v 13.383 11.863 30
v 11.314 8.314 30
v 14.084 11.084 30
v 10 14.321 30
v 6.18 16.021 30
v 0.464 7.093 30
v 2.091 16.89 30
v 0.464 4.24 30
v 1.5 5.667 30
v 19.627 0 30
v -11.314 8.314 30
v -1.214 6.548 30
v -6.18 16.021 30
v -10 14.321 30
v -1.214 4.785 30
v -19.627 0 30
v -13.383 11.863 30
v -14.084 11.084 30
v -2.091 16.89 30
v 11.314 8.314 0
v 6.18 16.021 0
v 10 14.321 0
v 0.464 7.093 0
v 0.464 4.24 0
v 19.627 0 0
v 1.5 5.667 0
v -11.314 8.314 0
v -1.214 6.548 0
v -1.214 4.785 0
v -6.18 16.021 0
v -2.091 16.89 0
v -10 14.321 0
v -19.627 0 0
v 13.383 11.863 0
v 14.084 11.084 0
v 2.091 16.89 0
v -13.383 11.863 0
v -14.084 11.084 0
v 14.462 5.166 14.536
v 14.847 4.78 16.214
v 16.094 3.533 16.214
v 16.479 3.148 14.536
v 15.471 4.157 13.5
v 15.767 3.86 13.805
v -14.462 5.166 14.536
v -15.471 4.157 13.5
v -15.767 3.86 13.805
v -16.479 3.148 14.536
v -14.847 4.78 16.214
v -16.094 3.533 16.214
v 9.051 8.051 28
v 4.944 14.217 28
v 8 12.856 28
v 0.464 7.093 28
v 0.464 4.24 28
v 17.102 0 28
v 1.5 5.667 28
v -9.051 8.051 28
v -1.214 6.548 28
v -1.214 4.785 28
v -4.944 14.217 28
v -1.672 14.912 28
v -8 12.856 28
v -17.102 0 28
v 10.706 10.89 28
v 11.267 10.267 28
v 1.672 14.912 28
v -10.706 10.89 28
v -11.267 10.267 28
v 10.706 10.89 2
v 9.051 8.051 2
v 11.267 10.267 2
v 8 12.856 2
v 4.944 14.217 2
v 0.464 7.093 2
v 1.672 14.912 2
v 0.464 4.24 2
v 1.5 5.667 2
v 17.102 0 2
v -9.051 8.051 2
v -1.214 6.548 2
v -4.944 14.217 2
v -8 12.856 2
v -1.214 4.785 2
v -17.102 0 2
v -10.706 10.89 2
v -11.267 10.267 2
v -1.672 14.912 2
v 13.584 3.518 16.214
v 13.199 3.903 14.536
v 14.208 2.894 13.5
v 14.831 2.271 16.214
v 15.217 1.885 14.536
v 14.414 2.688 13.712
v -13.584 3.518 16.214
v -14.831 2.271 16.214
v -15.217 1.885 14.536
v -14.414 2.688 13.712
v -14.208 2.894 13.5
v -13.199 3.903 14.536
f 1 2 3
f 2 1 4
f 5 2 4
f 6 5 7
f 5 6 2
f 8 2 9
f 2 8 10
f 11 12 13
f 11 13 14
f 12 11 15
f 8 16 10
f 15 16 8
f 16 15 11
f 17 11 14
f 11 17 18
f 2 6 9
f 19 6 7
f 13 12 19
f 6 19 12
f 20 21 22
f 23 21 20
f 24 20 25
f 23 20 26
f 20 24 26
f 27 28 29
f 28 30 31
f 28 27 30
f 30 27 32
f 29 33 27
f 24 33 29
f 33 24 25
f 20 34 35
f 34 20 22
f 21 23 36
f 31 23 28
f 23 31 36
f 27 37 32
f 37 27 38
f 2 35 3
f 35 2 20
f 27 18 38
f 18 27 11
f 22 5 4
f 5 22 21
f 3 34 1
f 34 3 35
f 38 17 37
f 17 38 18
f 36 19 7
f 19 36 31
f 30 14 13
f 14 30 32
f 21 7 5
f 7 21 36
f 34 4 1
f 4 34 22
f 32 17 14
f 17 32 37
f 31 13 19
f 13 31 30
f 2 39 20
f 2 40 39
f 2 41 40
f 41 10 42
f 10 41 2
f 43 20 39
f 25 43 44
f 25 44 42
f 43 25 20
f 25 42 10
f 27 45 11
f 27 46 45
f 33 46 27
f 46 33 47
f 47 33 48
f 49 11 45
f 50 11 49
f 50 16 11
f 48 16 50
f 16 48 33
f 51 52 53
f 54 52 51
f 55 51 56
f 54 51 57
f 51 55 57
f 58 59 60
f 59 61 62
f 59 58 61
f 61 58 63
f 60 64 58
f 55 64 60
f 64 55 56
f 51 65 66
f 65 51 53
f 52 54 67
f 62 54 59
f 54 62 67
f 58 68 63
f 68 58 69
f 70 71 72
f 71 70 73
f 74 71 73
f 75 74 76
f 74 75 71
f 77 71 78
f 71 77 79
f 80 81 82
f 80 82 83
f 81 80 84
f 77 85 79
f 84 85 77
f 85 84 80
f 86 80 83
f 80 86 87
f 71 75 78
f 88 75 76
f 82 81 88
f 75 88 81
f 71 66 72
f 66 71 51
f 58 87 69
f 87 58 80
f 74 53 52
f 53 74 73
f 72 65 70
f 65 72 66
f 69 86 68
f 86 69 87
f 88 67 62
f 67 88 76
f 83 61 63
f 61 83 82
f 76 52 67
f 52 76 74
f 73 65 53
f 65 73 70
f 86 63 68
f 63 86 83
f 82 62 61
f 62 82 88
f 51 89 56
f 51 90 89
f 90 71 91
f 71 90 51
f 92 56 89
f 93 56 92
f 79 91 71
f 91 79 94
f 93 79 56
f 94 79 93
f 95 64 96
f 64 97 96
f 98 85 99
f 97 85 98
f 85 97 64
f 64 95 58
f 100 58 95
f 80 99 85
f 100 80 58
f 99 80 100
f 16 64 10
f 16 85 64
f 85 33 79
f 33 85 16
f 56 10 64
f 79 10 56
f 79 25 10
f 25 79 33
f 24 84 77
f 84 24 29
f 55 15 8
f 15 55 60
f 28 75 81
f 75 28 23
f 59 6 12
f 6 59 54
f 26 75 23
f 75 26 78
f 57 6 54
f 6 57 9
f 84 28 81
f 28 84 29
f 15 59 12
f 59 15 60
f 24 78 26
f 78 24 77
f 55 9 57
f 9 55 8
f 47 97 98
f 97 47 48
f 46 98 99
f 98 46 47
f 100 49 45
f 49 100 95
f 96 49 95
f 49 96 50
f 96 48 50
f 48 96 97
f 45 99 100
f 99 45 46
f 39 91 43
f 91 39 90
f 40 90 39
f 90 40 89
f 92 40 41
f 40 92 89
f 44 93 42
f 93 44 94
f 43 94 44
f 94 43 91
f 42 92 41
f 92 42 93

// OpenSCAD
height = 30;
radius = 20;
thick = 4;
screw_d = 3;

module roof(radius, height) {
	rotate(-45)
	    intersection() {
	        cube([radius, radius, height]);
	        rotate(45) 
				cube([radius * 2, radius * 2, height]);
	    }
}

module round_edge(radius, height) {
	difference() {
        union() {
            roof(radius, height);
            mirror([1,0,0]) 
                roof(radius, height);
            cylinder(h = height, r = radius);
        }
        translate([0, -radius / 2, height / 2])
            cube([3 * radius, radius, height + 1], center=true);
   }
}

module cut_plane(radius, height, direction) {
	mirror_x = max(direction, 0);
	translate([direction * 2 * radius * sin(45), 0, -1])
		rotate(direction * 45)
       		mirror([mirror_x, 0, 0])
				translate([-1, 0, 0]) 
					cube([thick + 1, radius,  height + 2]);
}

module omega(radius, height) {
	difference() {
		round_edge(radius, height);
		cut_plane(radius, height, 1);
		cut_plane(radius, height, -1);
	}
}

module empty_omega(radius, height) {
	translate([0,  -thick / 2 - 1, 0]) 
		difference() {
			omega(radius, height);
			// inner omega
			translate([0, thick / 2, thick / 2]) 
				scale([(radius - thick) / radius, 
	                  (radius - thick) / radius, 
	                  (height - thick) / height])
					omega(radius, height);
			// cut bottom
			translate([-1.5 * radius, -radius + thick / 2 + 1, -1]) 
				cube([3 * radius, radius, height + 2]);
		}
	}
	
difference() {
	empty_omega(radius, height);
	// holes z
    translate([0,  (radius - thick / 2 - 1) / 3, -1])
		cylinder(h = height + 2, r = screw_d / 2);
	// hole x1
	translate([-(radius - thick / 2 - 2) * sin(45),  0, height / 2])
		rotate([0, 90, 135])
			cylinder(h = radius, r = screw_d / 2);
	// hole x2
	translate([(radius - thick / 2 - 2) * sin(45),  0, height / 2])
		rotate([0, 90, 45])
			cylinder(h = radius, r = screw_d / 2);
}
